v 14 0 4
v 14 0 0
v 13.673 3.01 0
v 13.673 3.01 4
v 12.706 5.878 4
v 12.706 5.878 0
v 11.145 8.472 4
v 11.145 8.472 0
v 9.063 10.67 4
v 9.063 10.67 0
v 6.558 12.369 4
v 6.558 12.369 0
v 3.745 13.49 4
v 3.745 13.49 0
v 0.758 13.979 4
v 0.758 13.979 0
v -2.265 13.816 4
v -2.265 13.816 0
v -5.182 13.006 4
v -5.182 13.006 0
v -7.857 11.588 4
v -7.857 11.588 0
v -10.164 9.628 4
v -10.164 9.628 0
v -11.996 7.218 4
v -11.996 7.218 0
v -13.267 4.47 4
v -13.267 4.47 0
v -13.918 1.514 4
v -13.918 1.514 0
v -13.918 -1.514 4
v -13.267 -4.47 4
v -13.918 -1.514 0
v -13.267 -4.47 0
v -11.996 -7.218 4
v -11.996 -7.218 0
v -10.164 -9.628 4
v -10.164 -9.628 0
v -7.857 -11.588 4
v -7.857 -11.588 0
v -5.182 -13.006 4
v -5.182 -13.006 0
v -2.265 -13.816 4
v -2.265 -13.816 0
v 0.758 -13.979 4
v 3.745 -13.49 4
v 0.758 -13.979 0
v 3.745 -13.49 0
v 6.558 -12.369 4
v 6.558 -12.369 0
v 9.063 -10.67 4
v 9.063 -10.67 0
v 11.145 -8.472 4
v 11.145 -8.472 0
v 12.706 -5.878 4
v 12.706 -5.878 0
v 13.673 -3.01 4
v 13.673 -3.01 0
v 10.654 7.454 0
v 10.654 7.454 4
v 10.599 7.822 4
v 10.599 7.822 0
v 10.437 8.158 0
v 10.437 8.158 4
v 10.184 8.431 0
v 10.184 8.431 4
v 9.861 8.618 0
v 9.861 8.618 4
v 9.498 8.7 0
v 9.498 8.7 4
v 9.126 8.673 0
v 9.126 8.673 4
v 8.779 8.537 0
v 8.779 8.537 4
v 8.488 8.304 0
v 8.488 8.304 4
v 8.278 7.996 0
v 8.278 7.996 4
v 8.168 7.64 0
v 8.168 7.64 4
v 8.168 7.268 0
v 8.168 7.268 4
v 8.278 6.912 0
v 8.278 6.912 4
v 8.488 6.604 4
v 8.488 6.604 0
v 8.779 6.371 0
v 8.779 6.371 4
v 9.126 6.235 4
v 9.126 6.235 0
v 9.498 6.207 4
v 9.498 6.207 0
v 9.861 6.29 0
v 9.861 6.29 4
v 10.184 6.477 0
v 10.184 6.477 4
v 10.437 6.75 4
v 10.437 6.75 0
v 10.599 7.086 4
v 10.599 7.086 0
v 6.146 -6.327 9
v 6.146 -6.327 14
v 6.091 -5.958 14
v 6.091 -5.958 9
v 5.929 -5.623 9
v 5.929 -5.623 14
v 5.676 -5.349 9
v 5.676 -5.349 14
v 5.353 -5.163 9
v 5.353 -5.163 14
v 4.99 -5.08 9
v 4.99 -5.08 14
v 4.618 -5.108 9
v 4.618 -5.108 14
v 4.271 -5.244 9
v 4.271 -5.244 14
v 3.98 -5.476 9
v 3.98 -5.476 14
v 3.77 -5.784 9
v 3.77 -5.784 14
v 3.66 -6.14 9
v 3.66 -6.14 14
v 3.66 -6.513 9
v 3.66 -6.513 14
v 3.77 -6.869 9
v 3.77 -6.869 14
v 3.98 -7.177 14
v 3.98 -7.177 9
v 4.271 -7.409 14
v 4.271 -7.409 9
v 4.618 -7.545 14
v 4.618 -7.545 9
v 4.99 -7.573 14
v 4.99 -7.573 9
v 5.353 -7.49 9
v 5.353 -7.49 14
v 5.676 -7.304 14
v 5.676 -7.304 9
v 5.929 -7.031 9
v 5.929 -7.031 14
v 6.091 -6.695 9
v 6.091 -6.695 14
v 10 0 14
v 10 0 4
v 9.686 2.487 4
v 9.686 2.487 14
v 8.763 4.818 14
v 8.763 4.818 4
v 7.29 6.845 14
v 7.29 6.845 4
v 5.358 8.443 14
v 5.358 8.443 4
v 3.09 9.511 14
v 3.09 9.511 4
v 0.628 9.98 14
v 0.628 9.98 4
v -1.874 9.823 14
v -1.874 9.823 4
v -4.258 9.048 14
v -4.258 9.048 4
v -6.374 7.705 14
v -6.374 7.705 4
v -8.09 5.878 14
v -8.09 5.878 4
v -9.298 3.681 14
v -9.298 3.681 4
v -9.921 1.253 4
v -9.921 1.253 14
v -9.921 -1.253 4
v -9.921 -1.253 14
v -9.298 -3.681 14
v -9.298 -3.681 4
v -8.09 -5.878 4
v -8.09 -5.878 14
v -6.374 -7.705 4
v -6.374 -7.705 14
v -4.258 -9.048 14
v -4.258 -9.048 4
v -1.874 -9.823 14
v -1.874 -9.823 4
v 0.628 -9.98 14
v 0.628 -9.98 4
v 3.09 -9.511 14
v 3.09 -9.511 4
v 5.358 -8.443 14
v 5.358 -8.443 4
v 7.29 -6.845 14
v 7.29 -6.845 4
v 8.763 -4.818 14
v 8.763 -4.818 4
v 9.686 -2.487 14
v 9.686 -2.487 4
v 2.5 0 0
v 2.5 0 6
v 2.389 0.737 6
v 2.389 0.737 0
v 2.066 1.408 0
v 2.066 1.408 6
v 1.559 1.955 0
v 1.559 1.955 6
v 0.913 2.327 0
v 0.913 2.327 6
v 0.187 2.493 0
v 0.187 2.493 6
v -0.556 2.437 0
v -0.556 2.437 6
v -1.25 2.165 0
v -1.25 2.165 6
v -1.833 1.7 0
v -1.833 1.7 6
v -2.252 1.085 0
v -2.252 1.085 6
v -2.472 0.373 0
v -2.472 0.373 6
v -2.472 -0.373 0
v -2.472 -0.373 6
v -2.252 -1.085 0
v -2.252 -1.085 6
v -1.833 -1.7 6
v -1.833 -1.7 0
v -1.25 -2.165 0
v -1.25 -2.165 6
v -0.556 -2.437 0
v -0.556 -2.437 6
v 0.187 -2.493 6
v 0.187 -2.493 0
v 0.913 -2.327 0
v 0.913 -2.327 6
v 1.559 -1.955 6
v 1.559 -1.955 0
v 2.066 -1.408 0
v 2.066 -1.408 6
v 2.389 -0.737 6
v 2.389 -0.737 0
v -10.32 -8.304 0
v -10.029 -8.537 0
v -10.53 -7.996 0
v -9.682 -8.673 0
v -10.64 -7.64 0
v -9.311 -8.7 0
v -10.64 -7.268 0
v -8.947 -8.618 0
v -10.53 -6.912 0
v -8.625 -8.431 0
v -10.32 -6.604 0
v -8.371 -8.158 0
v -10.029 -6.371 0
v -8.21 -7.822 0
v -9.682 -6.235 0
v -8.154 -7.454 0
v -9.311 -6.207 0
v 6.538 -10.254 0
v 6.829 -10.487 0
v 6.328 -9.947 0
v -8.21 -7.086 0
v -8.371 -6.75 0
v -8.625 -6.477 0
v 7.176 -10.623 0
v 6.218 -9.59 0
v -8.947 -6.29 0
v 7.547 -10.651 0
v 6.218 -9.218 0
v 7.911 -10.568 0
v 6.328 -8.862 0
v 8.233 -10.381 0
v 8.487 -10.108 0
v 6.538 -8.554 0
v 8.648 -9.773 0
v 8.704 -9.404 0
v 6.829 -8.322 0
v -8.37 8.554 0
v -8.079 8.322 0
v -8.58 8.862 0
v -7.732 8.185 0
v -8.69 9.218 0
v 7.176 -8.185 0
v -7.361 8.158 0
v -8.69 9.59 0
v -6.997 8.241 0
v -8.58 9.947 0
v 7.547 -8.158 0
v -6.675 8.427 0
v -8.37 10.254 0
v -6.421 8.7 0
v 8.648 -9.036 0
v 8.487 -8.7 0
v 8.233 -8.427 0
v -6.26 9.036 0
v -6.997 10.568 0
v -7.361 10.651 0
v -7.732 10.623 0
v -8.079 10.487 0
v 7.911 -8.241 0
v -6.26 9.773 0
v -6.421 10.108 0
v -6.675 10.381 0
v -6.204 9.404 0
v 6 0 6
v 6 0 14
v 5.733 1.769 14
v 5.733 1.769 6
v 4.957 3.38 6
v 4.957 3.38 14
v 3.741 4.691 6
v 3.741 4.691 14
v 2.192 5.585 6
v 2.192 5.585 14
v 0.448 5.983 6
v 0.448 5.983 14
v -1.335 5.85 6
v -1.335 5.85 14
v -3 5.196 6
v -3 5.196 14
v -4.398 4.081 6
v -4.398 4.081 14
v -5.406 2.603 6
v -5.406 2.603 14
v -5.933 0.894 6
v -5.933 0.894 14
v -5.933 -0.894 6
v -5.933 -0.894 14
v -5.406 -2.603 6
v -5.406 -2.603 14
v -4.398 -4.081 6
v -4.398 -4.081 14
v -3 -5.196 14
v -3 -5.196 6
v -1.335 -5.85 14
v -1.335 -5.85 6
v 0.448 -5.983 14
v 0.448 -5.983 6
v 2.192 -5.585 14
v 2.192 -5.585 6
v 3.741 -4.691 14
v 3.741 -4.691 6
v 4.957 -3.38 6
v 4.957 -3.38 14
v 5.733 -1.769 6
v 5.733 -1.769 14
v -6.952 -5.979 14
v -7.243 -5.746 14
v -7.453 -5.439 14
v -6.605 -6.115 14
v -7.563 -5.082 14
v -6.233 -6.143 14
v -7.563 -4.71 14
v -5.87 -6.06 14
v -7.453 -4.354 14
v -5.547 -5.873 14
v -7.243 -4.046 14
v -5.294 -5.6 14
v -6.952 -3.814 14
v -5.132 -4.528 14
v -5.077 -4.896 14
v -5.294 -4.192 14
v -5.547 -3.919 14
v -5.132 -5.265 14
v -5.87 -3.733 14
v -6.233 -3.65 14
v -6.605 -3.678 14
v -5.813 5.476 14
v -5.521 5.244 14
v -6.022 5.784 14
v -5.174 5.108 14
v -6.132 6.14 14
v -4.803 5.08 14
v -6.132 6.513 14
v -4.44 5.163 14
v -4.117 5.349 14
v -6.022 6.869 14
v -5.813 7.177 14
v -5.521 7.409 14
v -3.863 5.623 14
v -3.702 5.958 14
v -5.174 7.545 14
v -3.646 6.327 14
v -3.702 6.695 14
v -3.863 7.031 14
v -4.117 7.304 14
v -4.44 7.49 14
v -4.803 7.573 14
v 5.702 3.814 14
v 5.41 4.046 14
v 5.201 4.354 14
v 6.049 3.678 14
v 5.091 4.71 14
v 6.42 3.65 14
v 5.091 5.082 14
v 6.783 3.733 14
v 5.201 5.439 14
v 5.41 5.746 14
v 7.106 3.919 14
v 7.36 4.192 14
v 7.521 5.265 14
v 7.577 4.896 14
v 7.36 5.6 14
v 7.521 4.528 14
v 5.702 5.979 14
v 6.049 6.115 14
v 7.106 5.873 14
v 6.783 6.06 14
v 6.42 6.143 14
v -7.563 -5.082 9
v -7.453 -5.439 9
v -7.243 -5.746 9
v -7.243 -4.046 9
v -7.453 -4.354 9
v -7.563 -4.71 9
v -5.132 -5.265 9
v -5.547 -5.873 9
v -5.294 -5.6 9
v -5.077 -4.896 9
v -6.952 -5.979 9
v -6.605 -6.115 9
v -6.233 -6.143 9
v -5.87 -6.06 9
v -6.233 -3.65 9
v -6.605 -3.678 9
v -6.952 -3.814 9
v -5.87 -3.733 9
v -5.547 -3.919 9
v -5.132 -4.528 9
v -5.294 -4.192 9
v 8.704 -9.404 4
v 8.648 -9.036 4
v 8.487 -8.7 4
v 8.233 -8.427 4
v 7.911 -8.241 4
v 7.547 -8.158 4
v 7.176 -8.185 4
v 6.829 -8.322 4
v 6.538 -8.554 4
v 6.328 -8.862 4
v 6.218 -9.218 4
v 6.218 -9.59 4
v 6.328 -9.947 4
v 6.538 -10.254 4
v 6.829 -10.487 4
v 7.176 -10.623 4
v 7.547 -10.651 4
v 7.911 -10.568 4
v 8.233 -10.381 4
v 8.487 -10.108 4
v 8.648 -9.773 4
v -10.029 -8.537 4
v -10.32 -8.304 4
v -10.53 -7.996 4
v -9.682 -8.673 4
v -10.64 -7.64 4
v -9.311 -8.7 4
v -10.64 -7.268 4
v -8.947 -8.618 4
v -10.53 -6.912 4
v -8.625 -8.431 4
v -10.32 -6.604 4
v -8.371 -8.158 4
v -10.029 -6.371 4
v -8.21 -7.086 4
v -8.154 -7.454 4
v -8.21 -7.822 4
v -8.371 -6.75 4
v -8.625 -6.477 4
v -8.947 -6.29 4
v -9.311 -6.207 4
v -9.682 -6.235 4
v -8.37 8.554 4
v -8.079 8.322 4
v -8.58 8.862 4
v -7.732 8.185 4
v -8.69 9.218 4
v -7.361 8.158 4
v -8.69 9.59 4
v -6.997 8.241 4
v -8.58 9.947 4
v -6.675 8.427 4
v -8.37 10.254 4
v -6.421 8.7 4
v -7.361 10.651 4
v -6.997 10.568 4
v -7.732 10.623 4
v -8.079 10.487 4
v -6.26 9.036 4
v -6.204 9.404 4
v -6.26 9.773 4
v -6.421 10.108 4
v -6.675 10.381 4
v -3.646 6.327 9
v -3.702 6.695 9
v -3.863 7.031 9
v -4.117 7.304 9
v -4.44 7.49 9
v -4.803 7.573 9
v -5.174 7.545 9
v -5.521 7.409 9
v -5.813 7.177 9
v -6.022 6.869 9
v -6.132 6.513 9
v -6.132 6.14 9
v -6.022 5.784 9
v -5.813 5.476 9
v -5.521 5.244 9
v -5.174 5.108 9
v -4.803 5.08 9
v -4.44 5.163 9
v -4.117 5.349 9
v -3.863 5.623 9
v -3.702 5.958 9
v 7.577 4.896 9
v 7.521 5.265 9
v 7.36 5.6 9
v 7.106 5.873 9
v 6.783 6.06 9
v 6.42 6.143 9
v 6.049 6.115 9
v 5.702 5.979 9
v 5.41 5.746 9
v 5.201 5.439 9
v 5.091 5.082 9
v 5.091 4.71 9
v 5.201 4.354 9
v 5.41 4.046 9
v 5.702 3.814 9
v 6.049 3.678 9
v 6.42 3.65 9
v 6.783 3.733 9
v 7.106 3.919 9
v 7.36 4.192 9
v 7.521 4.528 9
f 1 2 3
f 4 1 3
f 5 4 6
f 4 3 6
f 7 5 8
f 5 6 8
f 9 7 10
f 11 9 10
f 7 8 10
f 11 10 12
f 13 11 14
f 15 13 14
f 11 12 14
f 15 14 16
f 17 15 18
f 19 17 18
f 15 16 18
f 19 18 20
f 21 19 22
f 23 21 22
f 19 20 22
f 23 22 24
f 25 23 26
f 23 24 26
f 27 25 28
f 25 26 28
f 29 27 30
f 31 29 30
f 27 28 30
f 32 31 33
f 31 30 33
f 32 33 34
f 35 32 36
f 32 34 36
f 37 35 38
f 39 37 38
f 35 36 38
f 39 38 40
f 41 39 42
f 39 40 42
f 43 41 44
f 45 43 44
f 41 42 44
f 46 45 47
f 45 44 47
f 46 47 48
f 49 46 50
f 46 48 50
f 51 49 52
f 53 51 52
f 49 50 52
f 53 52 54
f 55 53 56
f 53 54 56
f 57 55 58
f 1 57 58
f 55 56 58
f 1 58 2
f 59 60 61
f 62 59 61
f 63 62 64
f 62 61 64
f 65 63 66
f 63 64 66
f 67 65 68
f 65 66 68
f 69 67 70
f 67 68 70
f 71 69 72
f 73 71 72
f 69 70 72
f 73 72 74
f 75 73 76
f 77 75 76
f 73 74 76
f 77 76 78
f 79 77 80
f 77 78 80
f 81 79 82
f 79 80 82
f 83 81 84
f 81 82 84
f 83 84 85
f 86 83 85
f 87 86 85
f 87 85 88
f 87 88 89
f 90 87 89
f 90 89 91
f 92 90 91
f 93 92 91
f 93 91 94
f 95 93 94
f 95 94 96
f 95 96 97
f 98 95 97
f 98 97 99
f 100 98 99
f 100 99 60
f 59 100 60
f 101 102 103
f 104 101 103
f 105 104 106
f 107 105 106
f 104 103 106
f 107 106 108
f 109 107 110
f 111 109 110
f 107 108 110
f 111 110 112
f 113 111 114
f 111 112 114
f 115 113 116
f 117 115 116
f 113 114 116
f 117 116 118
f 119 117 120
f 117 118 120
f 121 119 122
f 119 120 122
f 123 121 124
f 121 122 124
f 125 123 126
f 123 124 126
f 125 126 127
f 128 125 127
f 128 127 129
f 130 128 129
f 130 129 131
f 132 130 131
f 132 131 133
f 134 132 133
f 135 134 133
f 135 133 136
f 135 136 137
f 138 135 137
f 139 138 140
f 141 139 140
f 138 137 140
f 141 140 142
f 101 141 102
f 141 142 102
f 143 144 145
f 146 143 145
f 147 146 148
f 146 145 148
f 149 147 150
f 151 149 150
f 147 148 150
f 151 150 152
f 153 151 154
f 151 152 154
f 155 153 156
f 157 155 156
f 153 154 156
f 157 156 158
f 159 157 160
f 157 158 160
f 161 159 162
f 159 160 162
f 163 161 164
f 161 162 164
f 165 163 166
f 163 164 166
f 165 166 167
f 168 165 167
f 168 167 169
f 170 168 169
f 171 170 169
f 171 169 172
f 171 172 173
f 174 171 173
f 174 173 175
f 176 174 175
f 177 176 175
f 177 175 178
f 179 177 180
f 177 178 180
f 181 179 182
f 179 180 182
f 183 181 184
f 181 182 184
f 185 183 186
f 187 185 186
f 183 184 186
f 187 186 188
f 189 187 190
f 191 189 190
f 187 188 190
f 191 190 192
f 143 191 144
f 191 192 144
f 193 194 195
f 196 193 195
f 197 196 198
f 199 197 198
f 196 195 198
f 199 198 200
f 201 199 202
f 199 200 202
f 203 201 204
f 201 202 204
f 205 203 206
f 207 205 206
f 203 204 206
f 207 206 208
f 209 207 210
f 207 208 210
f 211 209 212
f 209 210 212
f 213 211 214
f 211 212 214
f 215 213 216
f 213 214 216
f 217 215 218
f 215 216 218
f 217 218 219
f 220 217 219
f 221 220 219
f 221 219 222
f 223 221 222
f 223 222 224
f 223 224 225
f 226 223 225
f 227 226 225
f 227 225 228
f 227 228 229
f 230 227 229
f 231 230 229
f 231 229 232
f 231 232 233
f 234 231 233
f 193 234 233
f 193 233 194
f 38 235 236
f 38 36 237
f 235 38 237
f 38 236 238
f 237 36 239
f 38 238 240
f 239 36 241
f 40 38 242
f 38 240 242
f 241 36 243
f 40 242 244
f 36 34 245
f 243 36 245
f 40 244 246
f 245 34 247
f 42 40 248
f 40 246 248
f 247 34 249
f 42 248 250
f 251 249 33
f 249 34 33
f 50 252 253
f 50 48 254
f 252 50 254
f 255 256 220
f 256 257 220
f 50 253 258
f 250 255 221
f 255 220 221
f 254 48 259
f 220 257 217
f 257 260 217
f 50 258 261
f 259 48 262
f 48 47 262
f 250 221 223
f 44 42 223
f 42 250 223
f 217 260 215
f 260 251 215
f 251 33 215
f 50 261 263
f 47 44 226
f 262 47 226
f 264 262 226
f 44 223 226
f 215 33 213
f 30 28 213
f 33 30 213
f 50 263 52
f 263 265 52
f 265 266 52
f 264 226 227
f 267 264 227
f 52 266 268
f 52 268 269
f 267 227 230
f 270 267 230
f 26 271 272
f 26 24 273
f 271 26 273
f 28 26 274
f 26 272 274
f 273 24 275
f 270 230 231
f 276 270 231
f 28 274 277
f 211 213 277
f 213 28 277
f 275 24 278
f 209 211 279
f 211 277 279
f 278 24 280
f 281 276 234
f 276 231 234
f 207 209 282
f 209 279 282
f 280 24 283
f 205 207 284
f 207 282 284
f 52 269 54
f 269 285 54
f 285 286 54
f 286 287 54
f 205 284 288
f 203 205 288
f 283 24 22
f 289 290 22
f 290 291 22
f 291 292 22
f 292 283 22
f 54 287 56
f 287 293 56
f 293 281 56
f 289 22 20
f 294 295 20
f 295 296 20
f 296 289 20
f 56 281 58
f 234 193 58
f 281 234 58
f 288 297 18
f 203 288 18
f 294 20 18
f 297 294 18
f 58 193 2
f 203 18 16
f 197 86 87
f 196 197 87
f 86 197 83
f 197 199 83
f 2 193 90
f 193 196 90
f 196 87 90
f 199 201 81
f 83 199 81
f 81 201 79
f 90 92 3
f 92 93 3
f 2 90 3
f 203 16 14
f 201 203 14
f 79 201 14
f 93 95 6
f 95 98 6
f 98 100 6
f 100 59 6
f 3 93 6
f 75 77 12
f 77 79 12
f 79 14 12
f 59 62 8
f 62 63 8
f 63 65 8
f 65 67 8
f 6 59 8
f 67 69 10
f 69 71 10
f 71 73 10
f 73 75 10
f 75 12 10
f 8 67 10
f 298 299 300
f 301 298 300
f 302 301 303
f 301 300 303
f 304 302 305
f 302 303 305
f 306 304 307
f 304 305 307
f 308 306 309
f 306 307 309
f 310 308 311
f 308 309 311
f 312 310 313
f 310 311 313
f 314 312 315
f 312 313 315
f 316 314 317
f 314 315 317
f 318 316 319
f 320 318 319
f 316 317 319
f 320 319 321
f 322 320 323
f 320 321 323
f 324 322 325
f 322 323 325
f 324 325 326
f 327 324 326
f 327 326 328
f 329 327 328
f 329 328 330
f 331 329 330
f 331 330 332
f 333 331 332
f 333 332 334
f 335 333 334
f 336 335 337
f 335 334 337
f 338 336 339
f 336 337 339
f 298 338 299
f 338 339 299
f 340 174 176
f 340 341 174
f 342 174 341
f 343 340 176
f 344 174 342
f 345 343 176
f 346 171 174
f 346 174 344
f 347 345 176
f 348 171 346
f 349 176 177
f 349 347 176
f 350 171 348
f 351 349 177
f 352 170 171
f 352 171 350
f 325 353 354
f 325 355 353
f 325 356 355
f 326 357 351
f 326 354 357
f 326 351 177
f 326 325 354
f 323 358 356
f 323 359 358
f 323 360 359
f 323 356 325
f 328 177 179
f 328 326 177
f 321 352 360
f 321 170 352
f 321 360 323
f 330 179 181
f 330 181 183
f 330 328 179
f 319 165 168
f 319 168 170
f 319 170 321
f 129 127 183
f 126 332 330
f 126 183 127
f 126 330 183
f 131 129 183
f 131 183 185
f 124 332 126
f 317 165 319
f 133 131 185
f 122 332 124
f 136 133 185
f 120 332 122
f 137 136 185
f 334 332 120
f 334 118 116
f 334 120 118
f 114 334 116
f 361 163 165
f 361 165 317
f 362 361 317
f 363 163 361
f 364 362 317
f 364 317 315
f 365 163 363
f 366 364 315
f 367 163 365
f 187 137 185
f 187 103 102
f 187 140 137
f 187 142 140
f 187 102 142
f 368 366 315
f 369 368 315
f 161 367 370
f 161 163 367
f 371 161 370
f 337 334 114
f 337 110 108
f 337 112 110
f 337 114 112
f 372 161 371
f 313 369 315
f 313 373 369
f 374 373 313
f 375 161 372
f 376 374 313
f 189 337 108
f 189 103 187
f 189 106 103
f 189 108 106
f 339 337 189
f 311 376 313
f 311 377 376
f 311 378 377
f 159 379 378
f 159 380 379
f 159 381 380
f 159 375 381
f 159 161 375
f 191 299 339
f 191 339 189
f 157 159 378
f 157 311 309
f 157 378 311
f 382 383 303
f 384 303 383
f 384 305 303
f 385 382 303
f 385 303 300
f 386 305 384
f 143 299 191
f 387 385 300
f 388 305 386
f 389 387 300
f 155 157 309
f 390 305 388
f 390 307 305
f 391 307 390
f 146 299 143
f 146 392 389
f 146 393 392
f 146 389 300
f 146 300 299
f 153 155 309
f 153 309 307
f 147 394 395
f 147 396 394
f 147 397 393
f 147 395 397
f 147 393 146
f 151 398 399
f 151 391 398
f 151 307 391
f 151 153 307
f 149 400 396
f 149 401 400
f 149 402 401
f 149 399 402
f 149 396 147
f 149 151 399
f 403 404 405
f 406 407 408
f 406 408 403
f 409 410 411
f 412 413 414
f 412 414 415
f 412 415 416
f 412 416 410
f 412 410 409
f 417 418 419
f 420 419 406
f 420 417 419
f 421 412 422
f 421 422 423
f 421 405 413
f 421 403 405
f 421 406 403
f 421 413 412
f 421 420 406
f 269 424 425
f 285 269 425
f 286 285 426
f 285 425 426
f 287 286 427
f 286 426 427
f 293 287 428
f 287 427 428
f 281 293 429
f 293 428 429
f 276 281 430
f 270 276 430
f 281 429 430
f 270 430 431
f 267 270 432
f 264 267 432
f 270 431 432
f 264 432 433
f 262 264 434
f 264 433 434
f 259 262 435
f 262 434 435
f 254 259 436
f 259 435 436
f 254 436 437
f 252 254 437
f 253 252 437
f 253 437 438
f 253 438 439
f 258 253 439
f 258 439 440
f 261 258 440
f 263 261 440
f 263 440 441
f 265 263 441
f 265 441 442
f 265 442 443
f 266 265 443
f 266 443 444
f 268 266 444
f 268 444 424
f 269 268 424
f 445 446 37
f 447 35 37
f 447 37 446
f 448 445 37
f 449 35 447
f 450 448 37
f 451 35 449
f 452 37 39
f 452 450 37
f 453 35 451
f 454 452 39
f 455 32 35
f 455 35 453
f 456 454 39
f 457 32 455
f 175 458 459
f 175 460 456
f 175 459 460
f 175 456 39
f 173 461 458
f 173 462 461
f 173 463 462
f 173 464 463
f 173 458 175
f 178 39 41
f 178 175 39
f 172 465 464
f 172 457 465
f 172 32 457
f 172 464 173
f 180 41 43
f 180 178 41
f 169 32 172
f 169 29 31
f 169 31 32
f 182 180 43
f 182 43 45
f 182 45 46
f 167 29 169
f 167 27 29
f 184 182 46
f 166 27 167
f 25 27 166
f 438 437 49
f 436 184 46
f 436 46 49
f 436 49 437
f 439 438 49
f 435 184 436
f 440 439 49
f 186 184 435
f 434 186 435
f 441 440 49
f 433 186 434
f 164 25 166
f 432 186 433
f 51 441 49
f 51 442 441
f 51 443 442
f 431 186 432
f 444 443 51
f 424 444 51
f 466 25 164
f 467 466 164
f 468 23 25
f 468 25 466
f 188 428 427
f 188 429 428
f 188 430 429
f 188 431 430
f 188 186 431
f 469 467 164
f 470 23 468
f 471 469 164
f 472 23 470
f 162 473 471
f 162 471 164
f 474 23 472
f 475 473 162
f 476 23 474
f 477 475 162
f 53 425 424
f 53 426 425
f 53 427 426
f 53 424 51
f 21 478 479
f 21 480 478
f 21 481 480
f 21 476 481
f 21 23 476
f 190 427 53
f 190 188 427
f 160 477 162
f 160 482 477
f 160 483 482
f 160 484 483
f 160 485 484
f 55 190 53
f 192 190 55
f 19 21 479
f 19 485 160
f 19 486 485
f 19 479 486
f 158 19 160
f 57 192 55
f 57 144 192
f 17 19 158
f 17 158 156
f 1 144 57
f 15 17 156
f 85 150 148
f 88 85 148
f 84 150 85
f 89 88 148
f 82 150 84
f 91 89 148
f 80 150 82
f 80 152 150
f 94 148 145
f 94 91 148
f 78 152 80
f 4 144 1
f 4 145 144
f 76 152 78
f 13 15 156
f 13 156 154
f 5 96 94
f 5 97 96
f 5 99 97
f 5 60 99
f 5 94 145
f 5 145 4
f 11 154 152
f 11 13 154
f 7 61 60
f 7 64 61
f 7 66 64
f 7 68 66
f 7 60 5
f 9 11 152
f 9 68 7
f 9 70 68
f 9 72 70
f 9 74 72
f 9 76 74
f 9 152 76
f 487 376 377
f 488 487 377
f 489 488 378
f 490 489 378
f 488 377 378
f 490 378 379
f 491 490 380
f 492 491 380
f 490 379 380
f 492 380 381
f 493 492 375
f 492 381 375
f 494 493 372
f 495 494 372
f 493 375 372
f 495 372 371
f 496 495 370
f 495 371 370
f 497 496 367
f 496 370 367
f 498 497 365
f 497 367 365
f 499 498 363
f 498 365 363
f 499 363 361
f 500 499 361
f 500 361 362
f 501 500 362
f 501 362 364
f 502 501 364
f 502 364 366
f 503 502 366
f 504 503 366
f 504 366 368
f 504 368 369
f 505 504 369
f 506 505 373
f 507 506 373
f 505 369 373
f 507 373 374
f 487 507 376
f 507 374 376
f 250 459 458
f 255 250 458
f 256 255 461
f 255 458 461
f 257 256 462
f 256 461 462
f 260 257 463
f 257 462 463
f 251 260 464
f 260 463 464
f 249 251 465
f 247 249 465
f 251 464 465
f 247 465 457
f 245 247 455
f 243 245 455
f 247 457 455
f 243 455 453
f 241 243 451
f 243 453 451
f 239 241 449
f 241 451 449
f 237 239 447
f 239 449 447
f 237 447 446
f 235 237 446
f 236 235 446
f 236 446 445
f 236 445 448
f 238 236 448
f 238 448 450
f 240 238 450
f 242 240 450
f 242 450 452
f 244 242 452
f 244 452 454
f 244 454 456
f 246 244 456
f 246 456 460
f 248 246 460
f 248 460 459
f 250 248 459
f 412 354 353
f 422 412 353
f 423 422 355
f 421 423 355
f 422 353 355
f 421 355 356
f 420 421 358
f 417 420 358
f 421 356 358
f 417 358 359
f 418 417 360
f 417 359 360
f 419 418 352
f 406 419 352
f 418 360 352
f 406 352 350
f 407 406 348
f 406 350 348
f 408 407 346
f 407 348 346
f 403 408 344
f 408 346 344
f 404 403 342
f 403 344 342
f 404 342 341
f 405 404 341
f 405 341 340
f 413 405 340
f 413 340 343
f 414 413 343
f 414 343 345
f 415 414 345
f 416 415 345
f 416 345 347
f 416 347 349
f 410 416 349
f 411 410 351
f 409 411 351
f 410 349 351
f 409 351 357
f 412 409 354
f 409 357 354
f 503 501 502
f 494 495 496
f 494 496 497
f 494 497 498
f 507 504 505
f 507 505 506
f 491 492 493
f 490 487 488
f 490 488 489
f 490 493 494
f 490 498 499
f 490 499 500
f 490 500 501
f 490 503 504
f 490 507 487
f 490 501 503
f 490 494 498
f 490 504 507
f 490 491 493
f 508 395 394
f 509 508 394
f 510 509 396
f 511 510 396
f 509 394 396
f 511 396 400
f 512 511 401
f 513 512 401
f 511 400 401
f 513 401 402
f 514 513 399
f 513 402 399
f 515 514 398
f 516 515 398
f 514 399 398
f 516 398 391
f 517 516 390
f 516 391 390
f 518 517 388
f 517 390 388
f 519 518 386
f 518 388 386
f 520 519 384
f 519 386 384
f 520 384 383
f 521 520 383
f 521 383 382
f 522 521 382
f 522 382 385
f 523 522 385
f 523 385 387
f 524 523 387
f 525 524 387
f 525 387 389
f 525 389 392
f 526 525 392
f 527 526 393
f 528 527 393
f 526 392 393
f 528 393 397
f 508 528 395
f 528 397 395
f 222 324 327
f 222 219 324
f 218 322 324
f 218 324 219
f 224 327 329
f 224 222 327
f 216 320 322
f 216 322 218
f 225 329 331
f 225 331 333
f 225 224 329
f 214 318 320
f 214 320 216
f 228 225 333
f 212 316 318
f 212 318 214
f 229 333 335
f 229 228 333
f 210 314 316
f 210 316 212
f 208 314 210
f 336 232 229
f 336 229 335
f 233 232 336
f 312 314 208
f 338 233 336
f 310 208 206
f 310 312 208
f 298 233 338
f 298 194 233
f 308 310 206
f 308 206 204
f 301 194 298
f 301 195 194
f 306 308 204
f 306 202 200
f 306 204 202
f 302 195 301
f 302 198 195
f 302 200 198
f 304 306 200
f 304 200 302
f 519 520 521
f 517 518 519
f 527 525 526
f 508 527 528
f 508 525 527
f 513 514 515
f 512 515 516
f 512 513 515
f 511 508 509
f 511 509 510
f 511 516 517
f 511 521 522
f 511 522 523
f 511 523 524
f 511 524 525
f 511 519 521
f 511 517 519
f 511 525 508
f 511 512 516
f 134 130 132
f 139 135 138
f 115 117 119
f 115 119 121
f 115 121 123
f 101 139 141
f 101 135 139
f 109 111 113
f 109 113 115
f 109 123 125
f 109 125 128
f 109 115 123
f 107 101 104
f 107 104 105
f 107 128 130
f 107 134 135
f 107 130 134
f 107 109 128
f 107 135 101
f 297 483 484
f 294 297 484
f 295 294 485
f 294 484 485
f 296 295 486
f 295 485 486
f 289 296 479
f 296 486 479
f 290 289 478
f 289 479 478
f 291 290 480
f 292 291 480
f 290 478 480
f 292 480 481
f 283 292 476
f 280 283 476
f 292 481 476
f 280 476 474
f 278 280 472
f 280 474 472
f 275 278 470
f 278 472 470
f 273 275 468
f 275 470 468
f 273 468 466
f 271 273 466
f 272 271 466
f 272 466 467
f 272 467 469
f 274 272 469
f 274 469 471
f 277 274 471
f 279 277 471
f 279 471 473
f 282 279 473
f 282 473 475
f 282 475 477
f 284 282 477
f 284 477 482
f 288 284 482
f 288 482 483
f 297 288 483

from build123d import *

# Parameters (mm, degrees)
SKETCH_1_R          = 14
EXTRUDE_1_DEPTH     = 4
SKETCH_2_R          = 10
EXTRUDE_2_DEPTH     = 10
SKETCH_3_R          = 2.5
CUT_EXTRUDE_1_DEPTH = 25.248711306
SKETCH_4_R          = 6
CUT_EXTRUDE_2_DEPTH = 8
SKETCH_5_R          = 1.25
CUT_EXTRUDE_3_DEPTH = 8
SKETCH_6_R          = 1.25
CUT_EXTRUDE_4_DEPTH = 5


with BuildPart() as part:
    # 草图1 → 凸台-拉伸1 (new body)
    with BuildSketch(Plane.XY):
        Circle(SKETCH_1_R)
    extrude(amount=EXTRUDE_1_DEPTH)

    # 草图2 → 凸台-拉伸2 (add)
    with BuildSketch(Plane.XY.offset(4)):
        Circle(SKETCH_2_R)
    extrude(amount=EXTRUDE_2_DEPTH)

    # 草图3 → 切除-拉伸1 (cut, through all)
    with BuildSketch(Plane.XY.offset(14)):
        Circle(SKETCH_3_R)
    extrude(amount=-CUT_EXTRUDE_1_DEPTH, mode=Mode.SUBTRACT)

    # 草图4 → 切除-拉伸2 (cut)
    with BuildSketch(Plane.XY.offset(14)):
        Circle(SKETCH_4_R)
    extrude(amount=-CUT_EXTRUDE_2_DEPTH, mode=Mode.SUBTRACT)

    # 草图5 → 切除-拉伸3 (cut)
    with BuildSketch(Plane.XY.offset(4)):
        with Locations((-9.404150189, -7.453989484)):
            Circle(SKETCH_5_R)
        with Locations((-7.453989484, 9.404150189)):
            Circle(SKETCH_5_R)
        with Locations((9.404150189, 7.453989484)):
            Circle(SKETCH_5_R)
        with Locations((7.453989484, -9.404150189)):
            Circle(SKETCH_5_R)
    extrude(amount=-CUT_EXTRUDE_3_DEPTH, mode=Mode.SUBTRACT)

    # 草图6 → 切除-拉伸4 (cut)
    with BuildSketch(Plane.XY.offset(14)):
        with Locations((-6.326711752, -4.896194277)):
            Circle(SKETCH_6_R)
        with Locations((-4.896194277, 6.326711752)):
            Circle(SKETCH_6_R)
        with Locations((6.326711752, 4.896194277)):
            Circle(SKETCH_6_R)
        with Locations((4.896194277, -6.326711752)):
            Circle(SKETCH_6_R)
    extrude(amount=-CUT_EXTRUDE_4_DEPTH, mode=Mode.SUBTRACT)


solid = part.part
